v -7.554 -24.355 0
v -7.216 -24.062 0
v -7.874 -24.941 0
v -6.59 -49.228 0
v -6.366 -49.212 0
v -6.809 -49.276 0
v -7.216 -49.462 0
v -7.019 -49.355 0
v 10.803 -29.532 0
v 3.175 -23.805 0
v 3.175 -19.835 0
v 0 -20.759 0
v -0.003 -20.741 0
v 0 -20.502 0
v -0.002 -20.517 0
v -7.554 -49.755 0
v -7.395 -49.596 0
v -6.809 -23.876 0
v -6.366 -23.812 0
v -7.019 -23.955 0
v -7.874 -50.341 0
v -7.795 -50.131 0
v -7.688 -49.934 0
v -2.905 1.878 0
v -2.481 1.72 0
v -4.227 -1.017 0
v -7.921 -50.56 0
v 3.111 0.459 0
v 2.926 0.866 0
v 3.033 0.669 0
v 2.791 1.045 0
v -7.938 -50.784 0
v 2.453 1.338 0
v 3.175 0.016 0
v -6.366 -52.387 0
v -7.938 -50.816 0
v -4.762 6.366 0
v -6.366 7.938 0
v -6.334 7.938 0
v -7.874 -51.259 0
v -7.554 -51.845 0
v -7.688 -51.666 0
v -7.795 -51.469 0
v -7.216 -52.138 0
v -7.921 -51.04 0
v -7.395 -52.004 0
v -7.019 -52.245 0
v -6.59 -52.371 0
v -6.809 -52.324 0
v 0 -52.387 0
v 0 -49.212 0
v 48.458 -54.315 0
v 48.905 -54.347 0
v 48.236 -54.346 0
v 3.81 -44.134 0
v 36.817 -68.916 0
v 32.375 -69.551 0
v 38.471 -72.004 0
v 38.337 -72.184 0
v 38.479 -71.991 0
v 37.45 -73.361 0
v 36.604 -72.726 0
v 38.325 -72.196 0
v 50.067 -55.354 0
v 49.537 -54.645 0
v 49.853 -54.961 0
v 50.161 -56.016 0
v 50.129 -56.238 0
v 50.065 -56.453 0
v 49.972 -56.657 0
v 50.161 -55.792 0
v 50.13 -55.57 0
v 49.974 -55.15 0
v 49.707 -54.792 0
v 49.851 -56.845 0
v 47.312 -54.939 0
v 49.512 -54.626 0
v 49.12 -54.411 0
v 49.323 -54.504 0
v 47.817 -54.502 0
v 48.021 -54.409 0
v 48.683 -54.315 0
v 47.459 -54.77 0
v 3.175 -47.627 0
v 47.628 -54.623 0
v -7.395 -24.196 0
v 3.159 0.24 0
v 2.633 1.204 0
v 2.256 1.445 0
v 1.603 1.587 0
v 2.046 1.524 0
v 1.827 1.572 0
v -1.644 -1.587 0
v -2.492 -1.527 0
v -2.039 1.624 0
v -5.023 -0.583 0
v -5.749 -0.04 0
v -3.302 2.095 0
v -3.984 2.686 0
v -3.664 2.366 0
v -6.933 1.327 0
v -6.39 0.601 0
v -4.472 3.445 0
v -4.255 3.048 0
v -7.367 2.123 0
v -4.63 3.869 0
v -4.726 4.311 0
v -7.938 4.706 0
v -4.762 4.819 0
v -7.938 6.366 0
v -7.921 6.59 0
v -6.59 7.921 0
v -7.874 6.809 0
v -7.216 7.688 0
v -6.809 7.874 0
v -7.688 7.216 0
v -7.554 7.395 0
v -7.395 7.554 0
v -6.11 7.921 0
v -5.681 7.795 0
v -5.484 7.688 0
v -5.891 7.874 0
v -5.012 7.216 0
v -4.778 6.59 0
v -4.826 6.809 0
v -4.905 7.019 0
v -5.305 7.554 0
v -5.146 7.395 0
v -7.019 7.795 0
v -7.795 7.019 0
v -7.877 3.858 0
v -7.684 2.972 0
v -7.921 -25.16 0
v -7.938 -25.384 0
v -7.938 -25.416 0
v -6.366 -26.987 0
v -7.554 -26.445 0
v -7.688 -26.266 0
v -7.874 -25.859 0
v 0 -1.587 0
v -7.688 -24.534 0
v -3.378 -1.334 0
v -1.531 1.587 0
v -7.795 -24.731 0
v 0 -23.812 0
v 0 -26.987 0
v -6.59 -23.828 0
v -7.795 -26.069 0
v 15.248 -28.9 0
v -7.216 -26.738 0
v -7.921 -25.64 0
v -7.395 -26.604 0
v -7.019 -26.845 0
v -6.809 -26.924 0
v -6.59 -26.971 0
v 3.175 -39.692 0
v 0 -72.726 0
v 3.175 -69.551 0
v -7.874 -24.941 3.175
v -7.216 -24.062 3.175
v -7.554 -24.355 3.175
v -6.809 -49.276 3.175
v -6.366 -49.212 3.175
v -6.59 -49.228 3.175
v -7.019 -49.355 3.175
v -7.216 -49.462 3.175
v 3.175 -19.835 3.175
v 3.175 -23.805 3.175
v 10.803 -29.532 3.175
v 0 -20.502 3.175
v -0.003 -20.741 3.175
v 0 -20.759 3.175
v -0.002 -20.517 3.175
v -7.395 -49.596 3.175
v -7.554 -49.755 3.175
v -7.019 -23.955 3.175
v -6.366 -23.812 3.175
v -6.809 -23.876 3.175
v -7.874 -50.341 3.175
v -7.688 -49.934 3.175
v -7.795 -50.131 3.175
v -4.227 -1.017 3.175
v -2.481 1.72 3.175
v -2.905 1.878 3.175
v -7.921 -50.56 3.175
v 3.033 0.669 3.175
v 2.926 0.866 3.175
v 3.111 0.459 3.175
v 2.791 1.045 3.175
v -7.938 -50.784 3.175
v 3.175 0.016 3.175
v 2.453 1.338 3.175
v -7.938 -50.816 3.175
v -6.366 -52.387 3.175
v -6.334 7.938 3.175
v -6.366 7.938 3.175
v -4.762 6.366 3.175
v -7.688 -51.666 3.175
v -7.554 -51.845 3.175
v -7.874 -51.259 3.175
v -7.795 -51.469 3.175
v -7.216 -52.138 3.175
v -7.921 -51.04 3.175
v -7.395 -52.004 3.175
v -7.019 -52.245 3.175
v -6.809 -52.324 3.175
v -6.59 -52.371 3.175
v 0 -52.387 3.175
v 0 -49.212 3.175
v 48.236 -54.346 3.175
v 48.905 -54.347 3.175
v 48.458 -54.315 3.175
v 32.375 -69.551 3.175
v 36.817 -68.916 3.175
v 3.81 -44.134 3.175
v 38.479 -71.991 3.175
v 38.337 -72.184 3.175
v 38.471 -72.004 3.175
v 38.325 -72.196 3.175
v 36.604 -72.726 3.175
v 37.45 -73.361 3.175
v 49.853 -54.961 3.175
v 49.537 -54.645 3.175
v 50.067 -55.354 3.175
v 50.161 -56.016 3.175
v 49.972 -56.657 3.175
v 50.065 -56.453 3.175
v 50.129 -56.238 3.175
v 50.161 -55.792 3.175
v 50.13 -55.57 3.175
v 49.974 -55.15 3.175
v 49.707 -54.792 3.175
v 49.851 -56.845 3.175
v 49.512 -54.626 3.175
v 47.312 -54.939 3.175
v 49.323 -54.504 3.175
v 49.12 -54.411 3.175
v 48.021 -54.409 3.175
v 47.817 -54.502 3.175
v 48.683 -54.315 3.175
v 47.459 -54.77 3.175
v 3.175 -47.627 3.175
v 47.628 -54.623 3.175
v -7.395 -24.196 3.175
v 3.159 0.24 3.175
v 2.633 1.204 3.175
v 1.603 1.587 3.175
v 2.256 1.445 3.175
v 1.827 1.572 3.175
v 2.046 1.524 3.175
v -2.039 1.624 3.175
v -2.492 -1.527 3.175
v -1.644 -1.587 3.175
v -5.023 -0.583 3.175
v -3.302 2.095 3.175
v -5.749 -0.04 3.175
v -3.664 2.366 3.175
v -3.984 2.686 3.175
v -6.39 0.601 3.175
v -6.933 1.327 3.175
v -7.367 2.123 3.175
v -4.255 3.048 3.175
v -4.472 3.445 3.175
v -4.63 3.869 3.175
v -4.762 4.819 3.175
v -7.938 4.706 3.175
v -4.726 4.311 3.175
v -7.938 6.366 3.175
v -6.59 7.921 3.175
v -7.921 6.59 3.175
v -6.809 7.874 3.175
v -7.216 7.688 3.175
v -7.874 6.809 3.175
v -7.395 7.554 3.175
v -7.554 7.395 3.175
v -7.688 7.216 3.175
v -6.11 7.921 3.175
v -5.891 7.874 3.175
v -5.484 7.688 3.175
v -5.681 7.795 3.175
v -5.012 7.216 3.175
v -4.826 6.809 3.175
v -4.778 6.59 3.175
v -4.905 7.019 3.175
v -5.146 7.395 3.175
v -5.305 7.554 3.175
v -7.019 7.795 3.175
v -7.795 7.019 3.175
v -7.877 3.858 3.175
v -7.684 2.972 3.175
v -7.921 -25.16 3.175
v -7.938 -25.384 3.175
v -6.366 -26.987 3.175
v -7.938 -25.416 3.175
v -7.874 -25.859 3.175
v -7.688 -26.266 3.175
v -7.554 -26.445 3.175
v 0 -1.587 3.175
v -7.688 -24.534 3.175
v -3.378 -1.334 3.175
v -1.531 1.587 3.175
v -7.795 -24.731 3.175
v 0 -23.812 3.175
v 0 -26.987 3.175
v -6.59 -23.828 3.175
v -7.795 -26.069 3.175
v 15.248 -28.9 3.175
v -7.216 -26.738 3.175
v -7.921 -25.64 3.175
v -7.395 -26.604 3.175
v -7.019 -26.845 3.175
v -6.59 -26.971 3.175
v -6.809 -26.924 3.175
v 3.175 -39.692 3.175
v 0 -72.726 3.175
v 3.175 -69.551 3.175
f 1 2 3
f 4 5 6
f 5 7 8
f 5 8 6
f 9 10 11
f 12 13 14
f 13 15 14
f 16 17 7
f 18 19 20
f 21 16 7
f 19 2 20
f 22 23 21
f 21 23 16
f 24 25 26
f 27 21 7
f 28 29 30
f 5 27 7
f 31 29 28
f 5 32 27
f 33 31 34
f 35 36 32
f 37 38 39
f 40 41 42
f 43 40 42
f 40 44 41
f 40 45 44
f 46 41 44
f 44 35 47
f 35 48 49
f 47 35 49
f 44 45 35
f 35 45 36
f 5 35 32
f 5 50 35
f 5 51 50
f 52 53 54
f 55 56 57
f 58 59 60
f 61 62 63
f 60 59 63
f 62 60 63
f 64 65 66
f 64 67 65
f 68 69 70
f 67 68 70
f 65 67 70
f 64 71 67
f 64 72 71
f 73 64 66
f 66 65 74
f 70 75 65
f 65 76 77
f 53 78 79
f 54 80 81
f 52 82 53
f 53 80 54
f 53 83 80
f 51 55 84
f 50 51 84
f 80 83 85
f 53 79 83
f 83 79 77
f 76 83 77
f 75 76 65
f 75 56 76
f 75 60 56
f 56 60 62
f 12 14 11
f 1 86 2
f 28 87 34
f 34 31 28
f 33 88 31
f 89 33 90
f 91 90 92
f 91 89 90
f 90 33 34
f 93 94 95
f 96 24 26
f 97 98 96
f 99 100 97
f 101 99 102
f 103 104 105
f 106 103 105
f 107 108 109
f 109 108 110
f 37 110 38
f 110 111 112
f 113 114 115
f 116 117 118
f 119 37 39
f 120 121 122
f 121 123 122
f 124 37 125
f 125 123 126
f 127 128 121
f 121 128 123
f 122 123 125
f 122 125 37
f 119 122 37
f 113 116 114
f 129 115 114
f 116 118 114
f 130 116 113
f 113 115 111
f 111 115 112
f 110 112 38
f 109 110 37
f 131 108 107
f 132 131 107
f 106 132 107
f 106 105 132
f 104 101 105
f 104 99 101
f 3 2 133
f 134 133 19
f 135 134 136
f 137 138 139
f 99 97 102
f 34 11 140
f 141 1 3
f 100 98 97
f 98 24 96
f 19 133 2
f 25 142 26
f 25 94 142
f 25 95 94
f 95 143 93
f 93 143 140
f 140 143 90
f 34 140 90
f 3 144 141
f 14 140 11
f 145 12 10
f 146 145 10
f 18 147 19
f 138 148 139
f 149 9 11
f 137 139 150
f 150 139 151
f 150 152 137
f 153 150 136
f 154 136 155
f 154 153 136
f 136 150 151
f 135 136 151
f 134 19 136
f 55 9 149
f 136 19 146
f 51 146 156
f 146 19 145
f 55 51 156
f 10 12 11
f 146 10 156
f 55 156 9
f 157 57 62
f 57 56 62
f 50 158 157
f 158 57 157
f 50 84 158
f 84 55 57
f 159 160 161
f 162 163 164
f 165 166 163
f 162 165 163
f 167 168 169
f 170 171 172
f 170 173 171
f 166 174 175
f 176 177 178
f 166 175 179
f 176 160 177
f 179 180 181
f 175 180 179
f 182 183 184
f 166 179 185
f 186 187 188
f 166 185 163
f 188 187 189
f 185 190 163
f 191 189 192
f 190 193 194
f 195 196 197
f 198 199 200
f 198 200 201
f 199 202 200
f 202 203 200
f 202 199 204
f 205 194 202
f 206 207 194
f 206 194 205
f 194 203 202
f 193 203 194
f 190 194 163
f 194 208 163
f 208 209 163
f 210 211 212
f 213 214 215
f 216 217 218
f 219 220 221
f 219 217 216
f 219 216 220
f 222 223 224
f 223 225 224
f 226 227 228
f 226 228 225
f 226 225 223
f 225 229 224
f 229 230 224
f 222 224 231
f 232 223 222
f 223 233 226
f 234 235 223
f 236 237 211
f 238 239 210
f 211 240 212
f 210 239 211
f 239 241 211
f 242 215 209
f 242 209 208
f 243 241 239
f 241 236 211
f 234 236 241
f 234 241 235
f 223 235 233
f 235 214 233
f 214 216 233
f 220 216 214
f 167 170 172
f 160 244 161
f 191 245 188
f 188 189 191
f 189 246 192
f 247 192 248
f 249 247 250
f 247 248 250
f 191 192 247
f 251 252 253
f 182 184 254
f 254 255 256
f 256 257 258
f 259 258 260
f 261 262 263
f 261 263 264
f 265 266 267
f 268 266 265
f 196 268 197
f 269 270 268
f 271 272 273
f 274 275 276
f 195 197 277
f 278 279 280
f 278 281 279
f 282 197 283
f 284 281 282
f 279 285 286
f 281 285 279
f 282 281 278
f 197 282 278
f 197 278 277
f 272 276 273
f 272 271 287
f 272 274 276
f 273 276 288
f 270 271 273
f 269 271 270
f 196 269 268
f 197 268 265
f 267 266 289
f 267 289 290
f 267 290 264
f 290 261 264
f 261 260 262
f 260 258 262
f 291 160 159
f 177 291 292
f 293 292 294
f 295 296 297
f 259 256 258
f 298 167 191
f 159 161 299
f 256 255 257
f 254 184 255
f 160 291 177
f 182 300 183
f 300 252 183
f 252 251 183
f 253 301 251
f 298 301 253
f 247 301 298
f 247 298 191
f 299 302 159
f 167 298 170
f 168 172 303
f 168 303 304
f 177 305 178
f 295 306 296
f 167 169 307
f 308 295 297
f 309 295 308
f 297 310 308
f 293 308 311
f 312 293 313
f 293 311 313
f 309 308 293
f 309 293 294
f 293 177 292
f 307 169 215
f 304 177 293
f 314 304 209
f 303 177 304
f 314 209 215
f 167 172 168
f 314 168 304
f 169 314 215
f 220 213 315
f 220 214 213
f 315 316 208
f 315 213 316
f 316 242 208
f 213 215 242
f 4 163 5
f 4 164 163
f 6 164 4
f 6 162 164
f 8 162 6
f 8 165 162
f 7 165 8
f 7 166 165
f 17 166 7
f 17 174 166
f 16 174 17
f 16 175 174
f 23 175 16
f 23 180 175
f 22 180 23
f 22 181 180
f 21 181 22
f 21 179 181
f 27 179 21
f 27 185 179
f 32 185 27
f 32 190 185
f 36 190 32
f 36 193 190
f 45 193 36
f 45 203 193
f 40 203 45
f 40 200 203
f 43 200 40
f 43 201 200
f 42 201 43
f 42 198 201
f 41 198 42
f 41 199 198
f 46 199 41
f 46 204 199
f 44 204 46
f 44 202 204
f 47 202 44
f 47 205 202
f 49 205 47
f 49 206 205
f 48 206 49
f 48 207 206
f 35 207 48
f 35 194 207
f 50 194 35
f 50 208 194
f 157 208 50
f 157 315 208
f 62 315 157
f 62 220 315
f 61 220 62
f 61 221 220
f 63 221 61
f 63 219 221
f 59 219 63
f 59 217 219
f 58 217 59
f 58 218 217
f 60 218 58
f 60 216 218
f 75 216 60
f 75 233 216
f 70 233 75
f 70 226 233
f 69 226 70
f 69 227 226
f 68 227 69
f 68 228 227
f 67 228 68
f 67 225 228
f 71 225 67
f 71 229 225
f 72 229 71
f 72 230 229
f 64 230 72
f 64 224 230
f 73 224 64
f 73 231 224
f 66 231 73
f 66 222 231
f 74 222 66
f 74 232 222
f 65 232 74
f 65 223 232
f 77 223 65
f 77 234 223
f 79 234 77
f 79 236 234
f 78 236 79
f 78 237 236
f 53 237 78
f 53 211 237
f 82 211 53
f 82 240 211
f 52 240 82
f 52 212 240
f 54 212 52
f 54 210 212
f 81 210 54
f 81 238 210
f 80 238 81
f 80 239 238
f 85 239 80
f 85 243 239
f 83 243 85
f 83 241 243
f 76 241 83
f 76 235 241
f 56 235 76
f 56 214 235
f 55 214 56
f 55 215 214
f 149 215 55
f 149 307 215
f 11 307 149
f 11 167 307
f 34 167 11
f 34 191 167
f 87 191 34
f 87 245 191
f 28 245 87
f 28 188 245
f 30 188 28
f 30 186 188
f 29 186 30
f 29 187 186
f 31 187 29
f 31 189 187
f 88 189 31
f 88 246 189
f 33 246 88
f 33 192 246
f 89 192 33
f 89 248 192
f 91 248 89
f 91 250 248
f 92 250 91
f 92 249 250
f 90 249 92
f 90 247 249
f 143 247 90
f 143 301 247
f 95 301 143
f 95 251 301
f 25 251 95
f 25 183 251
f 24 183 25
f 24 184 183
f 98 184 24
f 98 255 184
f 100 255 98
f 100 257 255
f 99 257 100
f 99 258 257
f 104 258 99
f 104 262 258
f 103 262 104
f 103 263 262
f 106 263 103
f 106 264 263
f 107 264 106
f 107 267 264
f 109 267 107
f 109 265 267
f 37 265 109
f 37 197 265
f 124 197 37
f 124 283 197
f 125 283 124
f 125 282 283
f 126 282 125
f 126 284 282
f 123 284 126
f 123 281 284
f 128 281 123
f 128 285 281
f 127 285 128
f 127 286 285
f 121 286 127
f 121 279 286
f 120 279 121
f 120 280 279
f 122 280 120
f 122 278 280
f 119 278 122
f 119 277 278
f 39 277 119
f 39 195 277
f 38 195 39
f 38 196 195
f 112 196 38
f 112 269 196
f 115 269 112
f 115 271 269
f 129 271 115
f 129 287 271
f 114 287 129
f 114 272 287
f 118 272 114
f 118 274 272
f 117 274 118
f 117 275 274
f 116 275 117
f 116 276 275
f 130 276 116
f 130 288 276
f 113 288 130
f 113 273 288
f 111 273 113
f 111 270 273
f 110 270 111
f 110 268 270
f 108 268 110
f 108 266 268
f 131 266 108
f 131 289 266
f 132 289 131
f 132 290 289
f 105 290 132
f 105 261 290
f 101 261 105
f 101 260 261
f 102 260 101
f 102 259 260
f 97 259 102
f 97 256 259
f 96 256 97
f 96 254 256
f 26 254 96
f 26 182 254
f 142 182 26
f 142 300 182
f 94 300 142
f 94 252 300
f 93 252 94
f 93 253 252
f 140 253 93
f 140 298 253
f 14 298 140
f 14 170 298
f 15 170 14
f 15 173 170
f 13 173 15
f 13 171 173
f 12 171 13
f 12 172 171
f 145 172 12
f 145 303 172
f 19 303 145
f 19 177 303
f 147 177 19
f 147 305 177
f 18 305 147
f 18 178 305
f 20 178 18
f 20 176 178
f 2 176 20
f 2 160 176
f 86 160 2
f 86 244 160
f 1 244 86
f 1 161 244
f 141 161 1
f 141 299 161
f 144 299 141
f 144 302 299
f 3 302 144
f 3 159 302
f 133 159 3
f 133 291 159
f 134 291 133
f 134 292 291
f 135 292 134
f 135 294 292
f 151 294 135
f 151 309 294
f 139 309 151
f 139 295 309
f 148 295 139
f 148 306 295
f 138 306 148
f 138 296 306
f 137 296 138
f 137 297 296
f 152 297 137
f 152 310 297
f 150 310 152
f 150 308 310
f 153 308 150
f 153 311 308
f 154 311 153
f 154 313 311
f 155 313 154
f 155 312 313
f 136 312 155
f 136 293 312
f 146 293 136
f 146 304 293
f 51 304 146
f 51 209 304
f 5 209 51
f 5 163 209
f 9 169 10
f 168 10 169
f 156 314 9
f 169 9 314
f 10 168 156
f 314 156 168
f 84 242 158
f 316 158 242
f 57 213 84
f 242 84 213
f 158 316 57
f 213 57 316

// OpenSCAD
// file: ../lib/TOGArrayLib1.scad
// TOGArrayLib1.5
// 
// Functions for working with arrays.
// 
// v1.1:
// - tal1_reduce assert(is_list(items)) to prevent infinite recursion
//   when given undefined or other non-list values
// v1.1.1:
// - Fix tal1_uniq_remap_v2 to return "list-remap-result" as the
//   first element of the returned list
// v1.2:
// - Add tal1_replace_at function
// v1.3:
// - tal1_is_vec_of, tal1_is_vec_of_num
// v1.4:
// - tal1_assert_for_each, for when you want to assert something
//   about each of a list of items and get nice failure messages
// v1.5:
// - Add tal1_duplicate_reversed function, which may be
//   handy when generating symmetrical polygons and stuff.

/**
 * Make a list with the contents of list `a`,
 * but starting at offset `off`, replaced by the contents of list `b`.
 * len(result) = max(len(a), off+len(b))
 */
function tal1_replace_at(a, off, b, default_value=undef, default_value_function=undef) =
	assert(is_list(a))
	assert(is_list(b))
	let( _dvf = !is_undef(default_value_function) ? default_value_function : function(i) default_value )
[
	for( i=[0:1:min(off,len(a))-1] ) a[i],
	for( i=[len(a):1:off-1] ) _dvf(i),
	for( i=[off:1:off+len(b)-1] ) b[i-off],
	for( i=[off+len(b):1:len(a)-1] ) a[i],
];

// Simplest case
assert([] == tal1_replace_at([], 0, []));
// Second simplest cases
assert(["foo"] == tal1_replace_at(["foo"], 0, []));
assert(["foo"] == tal1_replace_at([], 0, ["foo"]));
// Replace one item
assert(["foo","quux","baz"] == tal1_replace_at(["foo","bar","baz"], 1, ["quux"]));
// Replace and extend
assert(["foo","quux","tuna","tina"] == tal1_replace_at(["foo","bar","baz"], 1, ["quux", "tuna", "tina"]));
// Add beyond end of `a`
assert(["foo","zzz","quux"] == tal1_replace_at(["foo"], 2, ["quux"], default_value="zzz"));
// Adding 'nothing' should still fill to that point with defaults
assert(["foo","zzz","zzz"] == tal1_replace_at(["foo"], 3, [], default_value="zzz"));


function tal1_reduce(start, items, func, offset=0) =
	assert(is_list(items))
	len(items) == offset ? start :
	tal1_reduce(func(start, items[offset]), items, func, offset+1);

function tal1_consecutive_duplicate_count(items) = tal1_reduce(
	[0, undef],
	items,
	function(z,item) [z[0] + (item == z[1] ? 1 : 0), item]
)[0];

assert(0 == tal1_consecutive_duplicate_count([]));
assert(0 == tal1_consecutive_duplicate_count([50]));
assert(1 == tal1_consecutive_duplicate_count([50,50]));
assert(0 == tal1_consecutive_duplicate_count([50,51,52,53]));
assert(1 == tal1_consecutive_duplicate_count([50,51,52,52]));
assert(3 == tal1_consecutive_duplicate_count([50,50,50,50]));

// Set test_size to arbirarily large values
// to ensure that OpenSCAD can handle heavy recursion
let(test_size=1000) assert(test_size/2 == tal1_consecutive_duplicate_count([for(i=[0:1:test_size-1]) floor(i/2)]));



function tal1_uniq_(items, off0, off1) =
	let(chunklen = off1-off0)
	chunklen == 0 ? [] :
	chunklen == 1 ? [items[off0]] :
	let(half=floor(chunklen/2))
	let(left  = tal1_uniq_(items, off0     , off0+half))
	let(right = tal1_uniq_(items, off0+half, off1     ))
	assert(len(left) > 0)
	assert(len(right) > 0)
	left[len(left)-1] == right[0] ? [each left, for(i=[1:1:len(right)-1]) right[i]] :
	[each left, each right];

/** Given a list of items, returns a new list with identical consecutive items merged */
function tal1_uniq(items) = tal1_uniq_(items, 0, len(items));

assert([] == tal1_uniq([]));
assert([123] == tal1_uniq([123]));
assert([55,0,1,2,3] == tal1_uniq([55,0,1,2,3]));
assert([55,0,1,2] == tal1_uniq([55,0,1,1,2]));
assert([55,0,1] == tal1_uniq([55,55,0,0,0,0,0,0,1,1,1,1]));
assert([55,0] == tal1_uniq([55,0,0,0,0,0,0,0]));



/**
 * Returns [new items, old index -> new index mapping].
 * No-op version.
 */
function tal1_uniq_remap_v1(items) =
	["list-remap-result", items, [for (vi=[0:1:len(items)-1]) vi]];

// [a, a, b, b, c, c]
//
// [a,    ...], []  -> [a],[0]
// [a, a, ...], [0] -> [a],[0,0]

assert([1,2,3] == [1,2,3]);

/**
 * Recursive version that will combine adjacent identical vertexes,
 * but will use the original items.
 */
function tal1_uniq_remap_v2(items, map=[]) =
	let(index = len(map))
	len(items) == index ? ["list-remap-result", items, map] :
	index == 0 ? tal1_uniq_remap_v2(items, [0]) :
	items[index] == items[map[index-1]] ? tal1_uniq_remap_v2(items, [for(vi=map) vi, map[index-1]]) :
	tal1_uniq_remap_v2(items, [for(vi=map) vi, index]);

assert(tal1_uniq_remap_v2([1,1,2,2,3,4]) == ["list-remap-result", [1,1,2,2,3,4], [0,0,2,2,4,5]]);


/**
 * Returns true if `vec` is a list of at least min_len items
 * and component_check(each item, even those beyond min_len) is true.
 */
function tal1_is_vec_of(vec, min_len=0, component_check=function(x) true) =
	assert(is_num(min_len) && min_len >= 0)
	assert(is_function(component_check))
	is_list(vec) && len(vec) >= min_len &&
	tal1_reduce(true, vec, function(prev,item) prev && component_check(item));

function tal1_is_vec_of_num(vec, min_len=0) = tal1_is_vec_of(vec, min_len, function(i) is_num(i));

assert( true == tal1_is_vec_of_num([1,2,3]));
assert( true == tal1_is_vec_of_num([]));
assert( true == tal1_is_vec_of_num([1,2,3], 3));
assert(false == tal1_is_vec_of_num([1,2], 3));
assert(false == tal1_is_vec_of_num([1,2,"spoon"], 3));
// Requirements are ambiguous when
// first min_len items are numbers, but there are non-numeric items afterwards,
// so let's error on the side of saying 'no, it's not a list of numbers';
// i.e. the item check and the min_len are independent.
assert(false == tal1_is_vec_of_num([1,2,3,"artichoke"], 3));


/**
 * Asserts that item_checker(each item in list, index of item)[0] is true.
 * Second element of item_checker return value is assertion message.
 * Returns the original list, in case that's useful to you.
 */
function tal1_assert_for_each(list, item_checker) =
	let( _ignored = [ for(i=[0:1:len(list)-1])
		let(q=item_checker(list[i],i))
		let(passed=is_bool(q) ? q : is_list(q) ? q[0] : assert(false, str(
			"tal1_assert_for_each: item_checker should return Bool|[Bool,String], but returned ",
			q, " for item at index ", i)))
		let(message=is_list(q) ? q[1] : undef)
		assert(passed, message)
		q
	])
	list;

// Callback can return a boolean...
assert([1,2,3] == tal1_assert_for_each([1,2,3], function(v,i) is_num(v)));
// ...or a [boolean, string]
assert([1,2,3] == tal1_assert_for_each([1,2,3], function(v,i) [is_num(v), "element be a num"]));

// [a, b, c] -> [a, b, c, rxf(c), rxf(b), rxf(a)]
function tal1_duplicate_reversed(list, rxf=function(item) item) =
	[
		each list,
		for( i=[len(list)-1 : -1 : 0] ) rxf(list[i]),
	];
// file: ../lib/TOGMod1Constructors.scad
// TOGMod1Constructors-v1.11
// 
// Functions to construct objects understood by TOGMod1
// 
// v1.1:
// - Add togmod1_make_rounded_rect
// v1.2:
// - togmod1_make_rounded_rect can make ovals
// v1.3:
// - togmod1_circle_points, to just get the points of a circle
// - if pos parameter to circle function has a third element,
//   returned vertexes will include it as the z component;
// v1.3.1
// - Some assertions
// v1.4:
// - Refactor togmod1_rounded_rect_points and togmod1_circle_points
//   to use togmod1__make_nd_vector_adder for adapting to whatever
//   `pos` parameter is.
// v1.5:
// - togmod_rounded_rect_points will not simplify completely rounded sides
//   (where length of side is exactly twice the rounding radius)
//   unless simplify_rounded_sides=true
//   - This makes it more useful for polyhedron generation,
//     where radius varies, but number of points must remain constant.
// v1.6:
// - togmod1_make_rect makes a simple rectangle
// - togmod1_make_rounded_rect will defer to togmod1_make_rect when r=0
// v1.7:
// - togmod1_make_circle will return empty shape (["union"]) when d=0
// v1.8:
// - Add togmod1_text
// v1.9:
// - togmod1_circle_points uses 3 as minimum circle point count instead of 6
// v1.10:
// - Fix togmod1_linear_extrude_y so that range corresponds to Y start/end and
//   polygon X,Y correspond to X,Z.  Previously it was rotated wrongly,
//   which would have gone unnoticed for symmetrical shapes centered at 0,0.
// v1.11:
// - Remove an 'echo'

use <./TOGArrayLib1.scad>

function togmod1__make_nd_vector_adder(origin=[0,0]) =
	let(origin_is_zero = tal1_reduce(true, origin, function(prev,item) prev && item == 0))
	origin_is_zero ? (function(vec) len(vec) >= len(origin) ? vec : tal1_replace_at(origin, 0, vec)) :
	function(vec) [
		for(i=[0:1:max(len(origin),len(vec))-1]) (len(vec) > i ? vec[i] : 0) + (len(origin) > i ? origin[i] : 0),
	];

assert([1,2,3] == togmod1__make_nd_vector_adder()([1,2,3]));
assert([1,2,3] == togmod1__make_nd_vector_adder([0,0,3])([1,2]));


function togmod1_make_cuboid(size) =
	assert(is_list(size))
	assert(len(size) >= 3)
	assert(is_num(size[0]))
	assert(is_num(size[1]))
	assert(is_num(size[2]))
	["polyhedron-vf", [
		[-size[0]/2, -size[1]/2, -size[2]/2],
		[+size[0]/2, -size[1]/2, -size[2]/2],
		[-size[0]/2, +size[1]/2, -size[2]/2],
		[+size[0]/2, +size[1]/2, -size[2]/2],
		[-size[0]/2, -size[1]/2, +size[2]/2],
		[+size[0]/2, -size[1]/2, +size[2]/2],
		[-size[0]/2, +size[1]/2, +size[2]/2],
		[+size[0]/2, +size[1]/2, +size[2]/2]
	], [
		[0,1,3,2],[0,4,5,1],[4,6,7,5],[3,7,6,2],[1,5,7,3],[6,4,0,2]
	]];

function togmod1_make_polygon(verts) =
	["polygon-vp", verts, [[for( i=[0:1:len(verts)-1] ) i%len(verts)]]];

function togmod1_rounded_rect_points(size, r, pos=[0,0], simplify_rounded_sides=false) =
	assert(is_list(size))
	assert(len(size) >= 2)
	let(radii = is_list(r) ? r : is_num(r) ? [r,r] : assert(false, "rounded_rect r(adius) should be list<num> or num"))
	let(rx = radii[0])
	let(ry = radii[1])
	assert(is_num(rx))
	assert(is_num(ry))
	assert(size[0] >= 2*rx, str("size[0] must be >= 2*r[0]; size[0] = ",size[0],", 2*r[0] = ",2*rx))
	assert(size[1] >= 2*ry, str("size[1] must be >= 2*r[1]; size[1] = ",size[1],", 2*r[1] = ",2*ry))
	let(quarterfn=max($fn/4, 1))
	let(qfnx = simplify_rounded_sides && size[0] == 2*rx ? quarterfn-1 : quarterfn)
	let(qfny = simplify_rounded_sides && size[1] == 2*ry ? quarterfn-1 : quarterfn)
	let(finalizepos = togmod1__make_nd_vector_adder(pos))
[
	for(a=[0 : 1 : qfnx]) let(ang=      a*90/quarterfn) finalizepos([ size[0]/2-rx + rx*cos(ang),  size[1]/2-ry + ry*sin(ang)]),
	for(a=[0 : 1 : qfny]) let(ang= 90 + a*90/quarterfn) finalizepos([-size[0]/2+rx + rx*cos(ang),  size[1]/2-ry + ry*sin(ang)]),
	for(a=[0 : 1 : qfnx]) let(ang=180 + a*90/quarterfn) finalizepos([-size[0]/2+rx + rx*cos(ang), -size[1]/2+ry + ry*sin(ang)]),
	for(a=[0 : 1 : qfny]) let(ang=270 + a*90/quarterfn) finalizepos([ size[0]/2-rx + rx*cos(ang), -size[1]/2+ry + ry*sin(ang)]),
];

function togmod1_make_rect(size) =
	togmod1_make_polygon([
		[-size[0]/2, -size[1]/2],
		[+size[0]/2, -size[1]/2],
		[+size[0]/2, +size[1]/2],
		[-size[0]/2, +size[1]/2],
	]);

function togmod1_make_rounded_rect(size, r) =
	r == 0 ? togmod1_make_rect(size) :
	togmod1_make_polygon(togmod1_rounded_rect_points(size,r,simplify_rounded_sides=true));

/**
 * Returns points for an approximation of a circle where points are at distance r from pos.
 * Can be used to make other regular polygons, but the faces will be less than that
 * distance from pos (do some trig if you want face distance, e.g. for a hex nut).
 */
function togmod1_circle_points(r, pos=[0,0], d=undef) =
	assert( !is_undef(r) || !is_undef(d) )
	assert(!is_undef(pos[0]))
	assert(!is_undef(pos[1]))
	let(finalizepos = togmod1__make_nd_vector_adder(pos))
	let(r_ = !is_undef(r) ? r : d/2)
	let(fn = max($fn, 3))
	[for(i=[0 : 1 : fn-1]) finalizepos([r_*cos(i*360/fn), r_*sin(i*360/fn)])];

function togmod1_make_circle(r, pos=[0,0], d=undef) =
	r == 0 || d == 0 ? ["union"] :
	togmod1_make_polygon(togmod1_circle_points(r=r, pos=pos, d=d));

function togmod1_make_cylinder(d, zrange=[0,1], r=undef, pos=[0,0]) =
	assert( !is_undef(r) || !is_undef(d) )
	let( r_ = !is_undef(r) ? r : d/2 )
	// TODO: Make polyhedron directly
	["linear-extrude-zs", zrange, togmod1_make_circle(r=r_, pos=pos)];

function togmod1__is_range1d(range) = is_list(range) && len(range) == 2 && is_num(range[0]) && is_num(range[1]);

function togmod1_linear_extrude_z(range, shape) =
	assert(togmod1__is_range1d(range))
	["linear-extrude-zs", range, shape];
function togmod1_linear_extrude_x(range, shape) =
	assert(togmod1__is_range1d(range))
	["rotate", [90, 0, 90], togmod1_linear_extrude_z(range, shape)];
function togmod1_linear_extrude_y(range, shape) =
	assert(togmod1__is_range1d(range))
	["rotate", [90, 0,  0], togmod1_linear_extrude_z([-range[1], -range[0]], shape)];

function togmod1_text(text, size, font, halign, valign, spacing, direction, language, script) =
	["text-tsfhvsdls", text, size, font, halign, valign, spacing, direction, language, script];
// file: ../lib/TOGMod1.scad
// TOGMod1.9
// OpenSCAD library for representing shapes
// 
// See also: Functional OpenSCAD (https://github.com/thehans/FunctionalOpenSCAD)
// 
// v1.8:
// - Add `text-tsfhvsdls`
// v1.9
// - Add `offset-ds` (offset with _d_elta a _s_hape)

module togmod1_domodule(mod) {
	assert(is_list(mod));
	assert(len(mod) > 0);
	if( mod[0] == "polygon-vp" ) {
		// ["polygon-vp", vertexes, paths]
		polygon(points=mod[1], paths=mod[2]);
	} else if( mod[0] == "polyhedron-vf" ) {
		polyhedron(mod[1], faces=mod[2]);
	} else if( mod[0] == "scale" ) {
		assert(len(mod) == 3);
		scale(mod[1]) togmod1_domodule(mod[2]);
	} else if( mod[0] == "translate" ) {
		assert(len(mod) == 3);
		assert(is_list(mod[1]));
		for(c=mod[1]) assert(is_num(c), "translate component should be numeric");
		translate(mod[1]) togmod1_domodule(mod[2]);
	} else if( mod[0] == "rotate" ) {
		assert(len(mod) == 3);
		rotate(mod[1]) togmod1_domodule(mod[2]);
	} else if( mod[0] == "intersection" ) {
		intersection_for( i=[1:1:len(mod)-1] ) togmod1_domodule(mod[i]);
	} else if( mod[0] == "difference" ) {
		difference() {
			togmod1_domodule(mod[1]);
			for( i=[2:1:len(mod)-1] ) togmod1_domodule(mod[i]);
		}
	} else if( mod[0] == "union" ) {
		for( i=[1:1:len(mod)-1] ) togmod1_domodule(mod[i]);
	} else if( mod[0] == "hull" ) {
		hull() for( i=[1:1:len(mod)-1] ) togmod1_domodule(mod[i]);
	} else if( mod[0] == "offset-rs" ) {
		assert(len(mod) == 3);
		assert(is_num(mod[1]));
		assert(is_list(mod[2]));
		offset(mod[1]) togmod1_domodule(mod[2]);
	} else if( mod[0] == "linear-extrude-zs" ) {
		// ["linear-extrude-zs", [z0,z1], 2d_shape] // centered
		// ["linear-extrude-zs", height, 2d_shape]
		let( zrange = is_list(mod[1]) ? mod[1] : [-mod[1]/2, mod[1]/2] ) {
			translate([0,0,zrange[0]]) linear_extrude(zrange[1]-zrange[0]) togmod1_domodule(mod[2]);
		}
	} else if( mod[0] == "render" ) {
		render() togmod1_domodule(mod[1]);
	} else if( mod[0] == "minkowski" ) {
		minkowski() {
			togmod1_domodule(mod[1]);
			togmod1_domodule(mod[2]);
		}
	} else if( mod[0] == "x-debug" ) {
		# togmod1_domodule(mod[1]);
	} else if( mod[0] == "x-color" ) {
		color(mod[1]) togmod1_domodule(mod[2]);
	} else if( mod[0] == "text-tsfhvsdls" ) {
		text(text=mod[1], size=mod[2], font=mod[3], halign=mod[4], valign=mod[5], spacing=mod[6], direction=mod[7], language=mod[7], script=mod[8]);
	} else if( mod[0] == "offset-ds" ) {
		assert(is_num(mod[1]));
		assert(is_list(mod[2]));
		offset(delta=mod[1]) togmod1_domodule(mod[2]);
	} else {
		assert(false, str("Unrecognized shape: ", mod[0]));
	}
}
// file: ../lib/TOGComplexLib1.scad
function tcplx1_multiply(a, b) =
	[a[0]*b[0] - a[1]*b[1], a[0]*b[1] + a[1]*b[0]];
function tcplx1_rotate(vec, angle) =
	tcplx1_multiply(vec, [cos(angle),sin(angle)]);
function tcplx1_divide(a, b) =
	let(bot = (b[0]*b[0] + b[1]*b[1]))
	[
		(a[0]*b[0] + a[1]*b[1])/bot,
		(a[1]*b[0] - a[0]*b[1])/bot
	];

assert([-11,23] == tcplx1_multiply([3,2], [1,7]));

assert([-1,3] == tcplx1_multiply([3,1], [0,1]));
assert([-1,3] == tcplx1_multiply([0,1], [3,1]));

echo(tcplx1_divide([-1,3], [3,1]));
assert([0,1] == tcplx1_divide([-1,3], [3,1]));

function tcplx1_normalize(vec) =
	let(veclen = sqrt(vec[0]*vec[0]+vec[1]*vec[1]))
	[vec[0] / veclen, vec[1] / veclen];

function tcplx1_relative_turnvec_vv(v0, v1) =
	tcplx1_divide(tcplx1_normalize(v1), tcplx1_normalize(v0));

function tcplx1_relative_turnvec_abc(p0, p1, p2) = tcplx1_relative_turnvec_vv(p1-p0, p2-p1);

// A 90-degree turn
assert([0,1] == tcplx1_relative_turnvec_abc([0,0], [1,0], [1,1]));
assert([0,1] == tcplx1_relative_turnvec_abc([0,0], [0,1], [-1,1]));

// A 45-degree turn
assert(tcplx1_normalize([1,1]) == tcplx1_relative_turnvec_abc([0,0], [1,0], [ 2,1]));
assert(tcplx1_normalize([1,1]) == tcplx1_relative_turnvec_abc([0,0], [0,1], [-1,2]));


function tcplx1_relative_angle_abc(p0, p1, p2) =
	let(turnvec = tcplx1_relative_turnvec_abc(p0, p1, p2))
	atan2(turnvec[1], turnvec[0]);

assert(-135 == tcplx1_relative_angle_abc([0,0], [1,0], [0,-1]));
assert( -90 == tcplx1_relative_angle_abc([0,0], [1,0], [1,-1]));
assert(   0 == tcplx1_relative_angle_abc([0,0], [1,0], [2, 0]));
assert(  90 == tcplx1_relative_angle_abc([0,0], [1,0], [1, 1]));
assert( 135 == tcplx1_relative_angle_abc([0,0], [1,0], [0, 1]));

assert(  90 == tcplx1_relative_angle_abc([1,1], [3,3], [1, 5]));
// main file
// PegboardHook0.1

angle = 36.9; // 0.1

module __pbh0__end_params() { }

use <../lib/TOGComplexLib1.scad>
use <../lib/TOGMod1.scad>
use <../lib/TOGMod1Constructors.scad>
use <../lib/TOGPath1.scad>

// ["solid", rath],
// ["open-path", rath]
// ["closed-path", rath]

/*
function raths_to_hook(shapes, w=3.175, d=3.175) =
	togmod1_linear_extrude_z([0, d], ["union",
		for( r=raths )
	];
*/

$fn = 48;

function pbh0_render_shape(shape, line_width) =
	shape[0] == "translate" || shape[0] == "rotate" ?
		[shape[0], shape[1], pbh0_render_shape(shape[2], line_width=line_width)] :
	shape[0] == "union" ?
		["union", for(i=[1:1:len(shape)-1]) pbh0_render_shape(shape[i], line_width=line_width)] :
	shape[0] == "solid" ?
		togmod1_make_polygon(togpath1_rath_to_polypoints(togpath1_offset_rath(shape[1], line_width/2))) :
	shape[0] == "open-path" ?
		togmod1_make_polygon(togpath1_rath_to_polypoints(togpath1_polyline_to_rath(
			togpath1_rath_to_polypoints(shape[1]),
			line_width/2
		))) :
	shape[0] == "closed-path" ?
		["difference",
			togmod1_make_polygon(togpath1_rath_to_polypoints(togpath1_offset_rath(shape[1],  line_width/2))),
			togmod1_make_polygon(togpath1_rath_to_polypoints(togpath1_offset_rath(shape[1], -line_width/2))),
		] :
	assert(false, str("Invalid shape: ", shape));

triangle_rath = ["togpath1-rath",
	["togpath1-rathnode", [0,-60]],
	["togpath1-rathnode", [30,-30], ["round", 10]],
	["togpath1-rathnode", [0,0]],
];

inch = 25.4;
u = inch/16;
line_width = 2*u;
line_depth = 2*u;

function pbh0_normal_bits(length_inches) =
	echo(length_inches=length_inches)
[
	["open-path", ["togpath1-rath", 
		["togpath1-rathnode", [-4*u, 4*u]],
		["togpath1-rathnode", [-4*u, 0*u], ["round", 3*u]],
		["togpath1-rathnode", [ 1*u, 0*u]],
	]],
	for( i=[1:1:length_inches] ) ["translate", [0,-i*inch], ["open-path", ["togpath1-rath", 
		["togpath1-rathnode", [-4*u, 0]],
		["togpath1-rathnode", [ 1*u, 0]],
	]]]
];

j_hook = ["union",
	each pbh0_normal_bits(1),
	
	// The hook/interesting part:
	["open-path", ["togpath1-rath", 
		["togpath1-rathnode", [ 1*u,     0]],
		["togpath1-rathnode", [ 1*u, -16*u]],
		["togpath1-rathnode", [ 1*u, -24*u], ["round", 6*u]],
		["togpath1-rathnode", [17*u, -24*u], ["round", 6*u]],
		["togpath1-rathnode", [17*u, -16*u]],
	]],
];

function make_square_hook(size,angle=0) =
let( pivot_pos = [ 1*u, -16*u-size[1]] )
let( floor_vec = tcplx1_rotate([size[0], 0], angle) )
let( front_vec = tcplx1_rotate([0, size[1]], angle) )
let( blunt_vec = tcplx1_rotate([0, size[1] * tan(angle)], angle - 90) )
["union",
	each pbh0_normal_bits(floor(-(pivot_pos[1] + floor_vec[1])/inch)),
	
	["open-path", ["togpath1-rath", 
		["togpath1-rathnode", [ 1*u,     0]],
		["togpath1-rathnode", pivot_pos],
		["togpath1-rathnode", pivot_pos + floor_vec],
		["togpath1-rathnode", pivot_pos + floor_vec + front_vec],
	]],
	
	if( angle != 0 ) ["open-path", ["togpath1-rath", 
		["togpath1-rathnode", pivot_pos + front_vec + blunt_vec],
		["togpath1-rathnode", pivot_pos + front_vec],
		["togpath1-rathnode", pivot_pos],
		["togpath1-rathnode", pivot_pos + [0, floor_vec[1]]],
		["togpath1-rathnode", pivot_pos + floor_vec],
	]],
];

echo(atan2(3,4));

shape = make_square_hook([28*u, 12*u], angle=0-angle);

togmod1_domodule(togmod1_linear_extrude_z([0, line_depth], pbh0_render_shape(shape, line_width=3.175)));
